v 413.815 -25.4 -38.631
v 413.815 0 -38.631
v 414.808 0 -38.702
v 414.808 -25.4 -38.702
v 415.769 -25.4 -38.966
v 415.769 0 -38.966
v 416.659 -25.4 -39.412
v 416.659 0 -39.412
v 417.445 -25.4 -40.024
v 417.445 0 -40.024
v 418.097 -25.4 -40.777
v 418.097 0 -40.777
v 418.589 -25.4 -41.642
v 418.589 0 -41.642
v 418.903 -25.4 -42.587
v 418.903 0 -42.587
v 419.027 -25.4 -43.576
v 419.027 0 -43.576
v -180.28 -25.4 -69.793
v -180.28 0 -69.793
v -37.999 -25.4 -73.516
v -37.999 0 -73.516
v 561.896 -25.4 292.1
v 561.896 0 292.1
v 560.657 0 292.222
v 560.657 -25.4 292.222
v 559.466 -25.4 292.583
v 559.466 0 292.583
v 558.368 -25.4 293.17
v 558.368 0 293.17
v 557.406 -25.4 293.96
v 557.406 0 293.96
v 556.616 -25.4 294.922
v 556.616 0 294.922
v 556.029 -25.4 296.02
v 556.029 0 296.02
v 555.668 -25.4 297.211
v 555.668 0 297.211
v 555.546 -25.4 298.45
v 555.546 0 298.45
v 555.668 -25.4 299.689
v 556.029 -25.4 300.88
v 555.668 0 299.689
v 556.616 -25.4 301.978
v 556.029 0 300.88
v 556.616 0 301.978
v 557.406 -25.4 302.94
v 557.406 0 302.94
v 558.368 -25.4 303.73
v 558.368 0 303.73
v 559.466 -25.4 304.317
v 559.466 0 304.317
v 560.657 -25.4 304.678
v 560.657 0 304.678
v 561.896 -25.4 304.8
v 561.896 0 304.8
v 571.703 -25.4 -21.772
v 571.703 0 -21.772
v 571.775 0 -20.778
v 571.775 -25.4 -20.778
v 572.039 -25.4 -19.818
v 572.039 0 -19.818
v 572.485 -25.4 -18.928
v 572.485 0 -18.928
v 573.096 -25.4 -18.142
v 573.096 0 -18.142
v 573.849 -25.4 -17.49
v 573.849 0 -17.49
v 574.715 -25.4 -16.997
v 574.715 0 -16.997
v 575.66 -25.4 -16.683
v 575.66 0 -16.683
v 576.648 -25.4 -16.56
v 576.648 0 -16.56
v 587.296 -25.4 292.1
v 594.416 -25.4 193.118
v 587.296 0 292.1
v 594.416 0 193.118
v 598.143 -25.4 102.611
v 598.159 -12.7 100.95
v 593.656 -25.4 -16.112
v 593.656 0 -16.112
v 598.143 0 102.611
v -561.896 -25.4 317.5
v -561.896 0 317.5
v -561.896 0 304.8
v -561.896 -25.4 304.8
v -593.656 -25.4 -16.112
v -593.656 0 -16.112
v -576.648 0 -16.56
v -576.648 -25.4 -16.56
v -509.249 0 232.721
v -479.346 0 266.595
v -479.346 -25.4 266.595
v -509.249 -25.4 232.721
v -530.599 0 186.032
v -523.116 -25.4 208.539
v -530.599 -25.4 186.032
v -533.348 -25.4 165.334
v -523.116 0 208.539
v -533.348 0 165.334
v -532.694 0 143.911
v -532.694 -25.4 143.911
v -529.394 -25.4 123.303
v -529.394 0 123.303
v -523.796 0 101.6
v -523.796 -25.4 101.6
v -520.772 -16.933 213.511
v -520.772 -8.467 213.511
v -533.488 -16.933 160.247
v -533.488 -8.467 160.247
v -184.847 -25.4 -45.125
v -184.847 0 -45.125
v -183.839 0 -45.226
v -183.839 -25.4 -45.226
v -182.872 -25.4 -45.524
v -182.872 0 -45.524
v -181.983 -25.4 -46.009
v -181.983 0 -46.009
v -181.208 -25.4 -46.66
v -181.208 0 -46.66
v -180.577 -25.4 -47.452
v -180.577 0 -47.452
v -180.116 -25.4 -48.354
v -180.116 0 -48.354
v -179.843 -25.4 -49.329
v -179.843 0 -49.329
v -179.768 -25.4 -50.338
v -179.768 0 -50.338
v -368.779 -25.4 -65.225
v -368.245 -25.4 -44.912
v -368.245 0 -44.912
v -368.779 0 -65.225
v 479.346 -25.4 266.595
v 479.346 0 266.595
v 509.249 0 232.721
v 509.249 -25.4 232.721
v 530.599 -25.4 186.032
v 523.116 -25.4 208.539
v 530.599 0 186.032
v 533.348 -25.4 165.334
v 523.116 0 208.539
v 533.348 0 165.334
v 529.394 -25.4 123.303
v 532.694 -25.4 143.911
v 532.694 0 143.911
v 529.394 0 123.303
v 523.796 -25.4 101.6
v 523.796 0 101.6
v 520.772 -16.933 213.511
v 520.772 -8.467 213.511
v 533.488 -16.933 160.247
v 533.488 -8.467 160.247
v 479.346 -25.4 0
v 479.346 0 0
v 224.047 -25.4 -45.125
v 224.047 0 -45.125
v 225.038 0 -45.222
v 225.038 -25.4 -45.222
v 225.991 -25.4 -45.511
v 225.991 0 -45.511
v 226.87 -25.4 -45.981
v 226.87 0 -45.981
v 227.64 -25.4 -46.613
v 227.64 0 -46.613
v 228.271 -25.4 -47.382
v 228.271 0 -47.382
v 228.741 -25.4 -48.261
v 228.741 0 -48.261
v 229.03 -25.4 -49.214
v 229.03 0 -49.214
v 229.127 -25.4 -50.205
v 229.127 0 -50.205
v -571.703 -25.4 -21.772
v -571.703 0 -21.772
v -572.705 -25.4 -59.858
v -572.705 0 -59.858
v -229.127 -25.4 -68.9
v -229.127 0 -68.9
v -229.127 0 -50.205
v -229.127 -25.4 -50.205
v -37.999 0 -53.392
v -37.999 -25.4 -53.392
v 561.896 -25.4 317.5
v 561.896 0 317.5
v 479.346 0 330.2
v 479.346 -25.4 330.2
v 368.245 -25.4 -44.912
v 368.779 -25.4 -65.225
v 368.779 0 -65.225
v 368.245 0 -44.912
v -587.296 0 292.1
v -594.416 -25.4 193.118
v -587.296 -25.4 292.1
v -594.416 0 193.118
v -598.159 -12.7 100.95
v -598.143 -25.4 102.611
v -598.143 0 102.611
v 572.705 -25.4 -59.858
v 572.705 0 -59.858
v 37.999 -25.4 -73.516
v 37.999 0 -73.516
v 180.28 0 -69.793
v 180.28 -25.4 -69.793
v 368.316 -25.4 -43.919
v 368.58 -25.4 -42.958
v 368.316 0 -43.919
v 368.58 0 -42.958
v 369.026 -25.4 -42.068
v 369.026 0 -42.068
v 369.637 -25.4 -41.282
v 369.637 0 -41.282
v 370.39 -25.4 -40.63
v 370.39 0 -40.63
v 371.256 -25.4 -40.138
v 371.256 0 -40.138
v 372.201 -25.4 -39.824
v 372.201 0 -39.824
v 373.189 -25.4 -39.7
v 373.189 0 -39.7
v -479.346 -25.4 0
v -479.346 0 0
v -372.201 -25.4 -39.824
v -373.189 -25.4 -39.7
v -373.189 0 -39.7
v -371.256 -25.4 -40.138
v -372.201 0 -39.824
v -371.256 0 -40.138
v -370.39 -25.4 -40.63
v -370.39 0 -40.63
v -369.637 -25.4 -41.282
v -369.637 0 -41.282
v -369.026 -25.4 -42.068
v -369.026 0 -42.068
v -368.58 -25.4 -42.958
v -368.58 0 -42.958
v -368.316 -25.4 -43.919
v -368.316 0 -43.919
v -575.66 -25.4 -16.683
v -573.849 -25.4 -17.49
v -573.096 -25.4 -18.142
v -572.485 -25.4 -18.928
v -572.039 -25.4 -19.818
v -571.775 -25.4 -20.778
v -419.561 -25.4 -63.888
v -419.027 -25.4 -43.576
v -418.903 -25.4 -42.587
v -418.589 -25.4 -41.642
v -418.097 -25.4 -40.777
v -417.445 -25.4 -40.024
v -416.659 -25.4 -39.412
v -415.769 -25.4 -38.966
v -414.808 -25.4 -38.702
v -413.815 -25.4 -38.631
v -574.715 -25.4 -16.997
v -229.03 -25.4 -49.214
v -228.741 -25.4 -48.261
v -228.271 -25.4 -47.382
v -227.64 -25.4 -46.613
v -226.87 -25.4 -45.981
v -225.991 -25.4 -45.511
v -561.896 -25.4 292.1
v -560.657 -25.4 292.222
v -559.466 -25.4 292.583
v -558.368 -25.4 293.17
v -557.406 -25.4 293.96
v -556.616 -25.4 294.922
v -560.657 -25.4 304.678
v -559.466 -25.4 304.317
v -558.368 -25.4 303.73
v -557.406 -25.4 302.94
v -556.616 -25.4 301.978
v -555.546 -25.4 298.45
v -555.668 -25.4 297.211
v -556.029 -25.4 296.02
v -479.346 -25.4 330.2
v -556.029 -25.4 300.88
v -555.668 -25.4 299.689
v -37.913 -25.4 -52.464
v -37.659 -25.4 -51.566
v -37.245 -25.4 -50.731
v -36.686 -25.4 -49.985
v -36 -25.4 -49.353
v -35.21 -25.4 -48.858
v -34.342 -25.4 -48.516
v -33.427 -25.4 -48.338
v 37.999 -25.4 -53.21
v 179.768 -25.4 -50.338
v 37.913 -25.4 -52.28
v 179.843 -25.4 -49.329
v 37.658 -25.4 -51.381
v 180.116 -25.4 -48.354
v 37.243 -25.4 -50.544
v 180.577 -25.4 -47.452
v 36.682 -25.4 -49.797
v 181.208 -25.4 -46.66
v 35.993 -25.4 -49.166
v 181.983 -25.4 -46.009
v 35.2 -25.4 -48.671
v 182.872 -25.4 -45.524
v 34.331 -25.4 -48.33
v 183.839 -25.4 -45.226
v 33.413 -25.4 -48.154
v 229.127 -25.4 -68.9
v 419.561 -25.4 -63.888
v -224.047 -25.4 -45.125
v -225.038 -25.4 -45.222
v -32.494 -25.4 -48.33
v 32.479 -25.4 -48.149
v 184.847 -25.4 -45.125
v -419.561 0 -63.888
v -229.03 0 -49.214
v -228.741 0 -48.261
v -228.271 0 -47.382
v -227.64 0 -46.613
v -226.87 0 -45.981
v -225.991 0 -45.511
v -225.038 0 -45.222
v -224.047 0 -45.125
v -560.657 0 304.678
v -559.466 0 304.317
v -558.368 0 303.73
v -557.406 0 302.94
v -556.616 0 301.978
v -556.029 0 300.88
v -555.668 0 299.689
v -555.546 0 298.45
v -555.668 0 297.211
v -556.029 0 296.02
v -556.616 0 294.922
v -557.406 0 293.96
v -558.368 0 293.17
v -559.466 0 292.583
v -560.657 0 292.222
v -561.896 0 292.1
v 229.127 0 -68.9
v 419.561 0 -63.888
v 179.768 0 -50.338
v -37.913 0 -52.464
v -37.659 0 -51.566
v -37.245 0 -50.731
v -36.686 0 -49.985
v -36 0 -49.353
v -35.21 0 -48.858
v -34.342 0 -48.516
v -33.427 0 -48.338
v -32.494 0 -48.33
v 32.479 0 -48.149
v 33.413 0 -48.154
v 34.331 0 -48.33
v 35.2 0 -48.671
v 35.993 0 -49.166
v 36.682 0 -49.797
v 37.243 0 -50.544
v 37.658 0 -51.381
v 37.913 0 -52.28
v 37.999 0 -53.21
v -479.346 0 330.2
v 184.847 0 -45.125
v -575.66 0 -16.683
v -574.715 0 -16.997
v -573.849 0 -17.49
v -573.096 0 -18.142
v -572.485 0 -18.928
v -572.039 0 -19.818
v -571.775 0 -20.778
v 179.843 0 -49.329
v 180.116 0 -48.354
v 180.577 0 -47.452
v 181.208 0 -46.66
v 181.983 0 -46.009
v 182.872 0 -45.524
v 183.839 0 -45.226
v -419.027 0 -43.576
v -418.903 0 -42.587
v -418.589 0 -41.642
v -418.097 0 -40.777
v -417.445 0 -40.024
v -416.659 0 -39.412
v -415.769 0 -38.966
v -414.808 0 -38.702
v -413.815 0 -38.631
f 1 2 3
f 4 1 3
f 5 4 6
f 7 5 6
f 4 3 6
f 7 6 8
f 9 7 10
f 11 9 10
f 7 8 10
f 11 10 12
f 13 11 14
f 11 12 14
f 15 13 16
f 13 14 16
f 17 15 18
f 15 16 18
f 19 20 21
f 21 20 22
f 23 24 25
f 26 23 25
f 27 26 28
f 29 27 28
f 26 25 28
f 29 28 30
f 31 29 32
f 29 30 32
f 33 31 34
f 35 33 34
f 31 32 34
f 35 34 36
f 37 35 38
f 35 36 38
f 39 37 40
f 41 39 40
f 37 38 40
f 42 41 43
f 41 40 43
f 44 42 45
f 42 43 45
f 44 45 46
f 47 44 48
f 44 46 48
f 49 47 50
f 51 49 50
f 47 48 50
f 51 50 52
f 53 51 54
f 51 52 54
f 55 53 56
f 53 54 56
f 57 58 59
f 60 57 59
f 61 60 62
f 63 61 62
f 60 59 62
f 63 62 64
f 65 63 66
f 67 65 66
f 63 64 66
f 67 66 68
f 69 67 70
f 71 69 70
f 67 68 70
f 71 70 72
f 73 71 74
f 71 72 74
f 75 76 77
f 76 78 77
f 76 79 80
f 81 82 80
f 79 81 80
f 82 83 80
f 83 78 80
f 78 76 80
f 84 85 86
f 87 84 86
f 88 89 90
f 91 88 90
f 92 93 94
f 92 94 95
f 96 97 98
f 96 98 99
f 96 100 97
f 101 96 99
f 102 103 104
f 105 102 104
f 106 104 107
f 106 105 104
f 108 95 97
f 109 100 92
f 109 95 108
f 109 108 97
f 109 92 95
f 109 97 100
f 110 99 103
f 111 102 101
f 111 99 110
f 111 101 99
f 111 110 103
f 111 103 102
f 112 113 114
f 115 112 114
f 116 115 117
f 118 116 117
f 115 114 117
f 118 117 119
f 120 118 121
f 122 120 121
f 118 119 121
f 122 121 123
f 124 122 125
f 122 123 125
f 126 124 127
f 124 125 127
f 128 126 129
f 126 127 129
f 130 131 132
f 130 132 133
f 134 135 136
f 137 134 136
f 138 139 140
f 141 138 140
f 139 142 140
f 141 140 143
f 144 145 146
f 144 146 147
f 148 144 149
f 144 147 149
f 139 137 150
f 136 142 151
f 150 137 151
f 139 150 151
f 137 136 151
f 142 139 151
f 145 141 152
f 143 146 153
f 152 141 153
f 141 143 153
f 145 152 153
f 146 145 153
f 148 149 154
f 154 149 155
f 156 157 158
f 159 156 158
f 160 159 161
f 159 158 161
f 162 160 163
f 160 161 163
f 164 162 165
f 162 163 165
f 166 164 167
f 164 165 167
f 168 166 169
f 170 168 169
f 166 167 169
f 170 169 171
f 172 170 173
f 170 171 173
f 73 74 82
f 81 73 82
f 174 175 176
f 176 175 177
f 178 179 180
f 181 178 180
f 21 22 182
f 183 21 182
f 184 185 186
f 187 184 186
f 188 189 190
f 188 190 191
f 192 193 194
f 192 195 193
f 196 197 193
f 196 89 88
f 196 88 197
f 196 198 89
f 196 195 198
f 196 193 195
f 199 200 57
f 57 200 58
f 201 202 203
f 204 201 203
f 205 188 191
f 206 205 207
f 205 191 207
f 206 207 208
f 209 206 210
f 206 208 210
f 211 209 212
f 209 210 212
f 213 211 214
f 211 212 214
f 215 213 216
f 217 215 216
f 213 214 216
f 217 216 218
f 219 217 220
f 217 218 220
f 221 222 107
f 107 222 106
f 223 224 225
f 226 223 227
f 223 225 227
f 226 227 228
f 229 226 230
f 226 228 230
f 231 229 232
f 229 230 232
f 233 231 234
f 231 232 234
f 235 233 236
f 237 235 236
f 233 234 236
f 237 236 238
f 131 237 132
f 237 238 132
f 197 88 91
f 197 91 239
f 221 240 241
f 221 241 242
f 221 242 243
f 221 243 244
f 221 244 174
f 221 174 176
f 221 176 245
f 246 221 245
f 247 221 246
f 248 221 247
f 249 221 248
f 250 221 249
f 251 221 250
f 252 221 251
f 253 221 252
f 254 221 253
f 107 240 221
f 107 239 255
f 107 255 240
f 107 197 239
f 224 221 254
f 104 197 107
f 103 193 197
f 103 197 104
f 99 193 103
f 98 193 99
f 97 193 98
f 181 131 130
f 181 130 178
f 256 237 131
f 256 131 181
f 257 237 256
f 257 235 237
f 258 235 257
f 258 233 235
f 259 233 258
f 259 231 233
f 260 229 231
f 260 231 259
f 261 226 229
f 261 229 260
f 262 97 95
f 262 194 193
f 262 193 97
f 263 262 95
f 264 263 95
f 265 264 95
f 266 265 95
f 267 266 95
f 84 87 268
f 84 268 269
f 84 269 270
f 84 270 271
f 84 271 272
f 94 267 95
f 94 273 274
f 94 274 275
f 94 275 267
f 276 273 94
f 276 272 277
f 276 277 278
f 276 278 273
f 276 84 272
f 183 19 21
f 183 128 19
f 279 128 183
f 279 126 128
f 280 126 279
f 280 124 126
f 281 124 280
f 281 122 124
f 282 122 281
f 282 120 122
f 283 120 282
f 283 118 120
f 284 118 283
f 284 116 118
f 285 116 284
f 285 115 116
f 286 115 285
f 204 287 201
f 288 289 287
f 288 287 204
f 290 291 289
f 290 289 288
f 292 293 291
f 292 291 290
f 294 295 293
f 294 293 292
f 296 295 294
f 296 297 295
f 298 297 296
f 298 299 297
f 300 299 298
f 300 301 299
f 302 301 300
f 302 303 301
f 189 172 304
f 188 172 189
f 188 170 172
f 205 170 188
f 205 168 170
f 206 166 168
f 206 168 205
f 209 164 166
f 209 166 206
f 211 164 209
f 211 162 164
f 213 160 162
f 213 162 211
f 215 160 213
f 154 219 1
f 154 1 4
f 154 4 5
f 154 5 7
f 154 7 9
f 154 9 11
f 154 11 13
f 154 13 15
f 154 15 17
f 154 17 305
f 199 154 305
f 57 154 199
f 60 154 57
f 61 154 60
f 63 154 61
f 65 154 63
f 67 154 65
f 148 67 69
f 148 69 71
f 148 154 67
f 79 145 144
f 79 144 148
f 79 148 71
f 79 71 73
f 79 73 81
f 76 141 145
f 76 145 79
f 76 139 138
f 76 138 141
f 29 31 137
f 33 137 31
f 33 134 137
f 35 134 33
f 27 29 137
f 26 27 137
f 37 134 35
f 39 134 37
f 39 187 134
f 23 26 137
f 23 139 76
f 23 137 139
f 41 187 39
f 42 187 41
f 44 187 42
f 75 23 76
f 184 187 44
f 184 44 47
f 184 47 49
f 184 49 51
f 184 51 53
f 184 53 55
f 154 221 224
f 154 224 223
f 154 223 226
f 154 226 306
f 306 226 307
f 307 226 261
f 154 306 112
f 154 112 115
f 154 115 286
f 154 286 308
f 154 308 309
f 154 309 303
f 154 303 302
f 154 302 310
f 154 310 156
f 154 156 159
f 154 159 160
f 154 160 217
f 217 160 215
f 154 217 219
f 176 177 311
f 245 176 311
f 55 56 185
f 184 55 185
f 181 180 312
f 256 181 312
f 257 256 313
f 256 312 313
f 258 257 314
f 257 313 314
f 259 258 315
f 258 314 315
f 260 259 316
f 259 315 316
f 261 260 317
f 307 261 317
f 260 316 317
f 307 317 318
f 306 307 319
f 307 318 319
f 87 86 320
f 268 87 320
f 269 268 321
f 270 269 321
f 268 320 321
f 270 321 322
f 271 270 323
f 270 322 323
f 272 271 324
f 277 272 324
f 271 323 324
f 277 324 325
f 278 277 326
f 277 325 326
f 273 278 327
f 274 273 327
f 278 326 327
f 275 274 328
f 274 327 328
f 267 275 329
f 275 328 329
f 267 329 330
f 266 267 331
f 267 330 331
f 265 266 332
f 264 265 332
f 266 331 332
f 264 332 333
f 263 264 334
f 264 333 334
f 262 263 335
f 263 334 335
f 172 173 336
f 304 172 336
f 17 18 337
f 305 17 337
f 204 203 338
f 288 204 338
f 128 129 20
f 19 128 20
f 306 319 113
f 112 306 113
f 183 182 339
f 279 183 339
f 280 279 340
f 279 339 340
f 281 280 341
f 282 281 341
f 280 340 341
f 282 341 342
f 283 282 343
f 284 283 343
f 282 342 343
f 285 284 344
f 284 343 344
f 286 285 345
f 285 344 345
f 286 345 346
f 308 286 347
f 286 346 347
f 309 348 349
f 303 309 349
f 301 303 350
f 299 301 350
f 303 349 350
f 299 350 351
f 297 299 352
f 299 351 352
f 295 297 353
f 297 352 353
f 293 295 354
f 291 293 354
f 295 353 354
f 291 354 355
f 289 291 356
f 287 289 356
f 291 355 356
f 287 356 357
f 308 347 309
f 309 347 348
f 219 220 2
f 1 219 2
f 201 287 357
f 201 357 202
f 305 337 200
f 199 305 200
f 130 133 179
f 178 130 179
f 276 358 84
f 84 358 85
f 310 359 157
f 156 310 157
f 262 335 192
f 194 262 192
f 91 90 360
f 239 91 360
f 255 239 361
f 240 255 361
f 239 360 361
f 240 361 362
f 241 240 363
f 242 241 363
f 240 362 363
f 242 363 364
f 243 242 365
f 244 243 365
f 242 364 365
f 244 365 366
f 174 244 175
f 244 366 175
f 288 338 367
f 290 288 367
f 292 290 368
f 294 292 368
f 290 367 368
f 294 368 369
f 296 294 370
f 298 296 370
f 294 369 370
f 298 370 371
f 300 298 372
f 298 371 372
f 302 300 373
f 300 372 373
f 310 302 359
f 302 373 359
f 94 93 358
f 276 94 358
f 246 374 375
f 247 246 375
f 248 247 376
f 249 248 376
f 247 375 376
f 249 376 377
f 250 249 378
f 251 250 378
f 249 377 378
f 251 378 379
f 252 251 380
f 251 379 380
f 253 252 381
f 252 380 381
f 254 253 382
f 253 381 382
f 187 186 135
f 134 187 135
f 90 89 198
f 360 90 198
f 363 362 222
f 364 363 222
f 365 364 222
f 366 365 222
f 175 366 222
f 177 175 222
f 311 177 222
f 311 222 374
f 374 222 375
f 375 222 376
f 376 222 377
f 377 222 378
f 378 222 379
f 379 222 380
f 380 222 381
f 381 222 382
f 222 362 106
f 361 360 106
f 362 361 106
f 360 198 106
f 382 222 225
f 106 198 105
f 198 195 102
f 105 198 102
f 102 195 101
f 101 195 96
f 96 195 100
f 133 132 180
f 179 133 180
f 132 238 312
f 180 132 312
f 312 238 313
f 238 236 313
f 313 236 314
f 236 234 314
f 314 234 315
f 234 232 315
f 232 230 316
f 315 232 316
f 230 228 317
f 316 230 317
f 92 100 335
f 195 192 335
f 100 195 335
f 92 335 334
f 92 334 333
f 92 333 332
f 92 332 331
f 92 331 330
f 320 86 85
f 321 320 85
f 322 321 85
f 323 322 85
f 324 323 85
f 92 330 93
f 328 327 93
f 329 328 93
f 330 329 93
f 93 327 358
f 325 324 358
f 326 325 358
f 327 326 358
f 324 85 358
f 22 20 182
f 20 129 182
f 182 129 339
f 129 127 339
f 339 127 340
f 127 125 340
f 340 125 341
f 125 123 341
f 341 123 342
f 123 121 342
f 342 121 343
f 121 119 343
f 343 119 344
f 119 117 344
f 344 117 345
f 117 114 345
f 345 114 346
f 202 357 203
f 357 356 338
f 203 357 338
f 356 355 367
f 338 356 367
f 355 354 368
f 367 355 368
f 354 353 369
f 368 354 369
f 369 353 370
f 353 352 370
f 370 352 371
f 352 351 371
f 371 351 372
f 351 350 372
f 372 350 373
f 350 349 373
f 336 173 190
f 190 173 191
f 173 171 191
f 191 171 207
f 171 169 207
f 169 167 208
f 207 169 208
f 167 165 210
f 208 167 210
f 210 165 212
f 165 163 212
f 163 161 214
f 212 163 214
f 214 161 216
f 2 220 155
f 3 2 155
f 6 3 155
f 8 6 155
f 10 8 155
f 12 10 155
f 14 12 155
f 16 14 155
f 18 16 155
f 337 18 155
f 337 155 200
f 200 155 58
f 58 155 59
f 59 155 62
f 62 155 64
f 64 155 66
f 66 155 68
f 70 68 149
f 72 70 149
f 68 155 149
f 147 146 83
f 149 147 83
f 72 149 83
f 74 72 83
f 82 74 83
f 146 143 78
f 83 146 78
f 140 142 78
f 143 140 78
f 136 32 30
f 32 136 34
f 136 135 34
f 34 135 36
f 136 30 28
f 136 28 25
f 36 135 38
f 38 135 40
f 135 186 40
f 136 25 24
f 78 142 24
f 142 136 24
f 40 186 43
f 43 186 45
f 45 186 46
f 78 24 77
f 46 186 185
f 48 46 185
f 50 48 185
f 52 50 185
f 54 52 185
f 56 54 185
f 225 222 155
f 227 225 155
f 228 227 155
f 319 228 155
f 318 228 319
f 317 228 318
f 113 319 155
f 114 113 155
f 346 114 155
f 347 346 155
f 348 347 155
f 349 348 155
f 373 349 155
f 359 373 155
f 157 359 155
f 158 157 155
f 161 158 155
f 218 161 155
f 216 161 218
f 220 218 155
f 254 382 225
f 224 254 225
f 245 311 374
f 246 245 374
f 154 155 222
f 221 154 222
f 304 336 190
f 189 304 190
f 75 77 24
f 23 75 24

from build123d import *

# Parameters (mm, degrees)
F1_DEPTH = 25.4


with BuildPart() as f1:
    # F0 (on Front) → F1 (new body)
    with BuildSketch(Plane.XZ):
        with BuildLine():
            Line((-180.280449281, -69.793186067), (-37.9985533655, -73.516196597))
            Line((-37.9985533655, -73.516196597), (-37.9985533655, -53.3922091126))
            ThreePointArc((-37.9985533655, -53.3922091126), (-36.3574166334, -49.6531424612), (-32.4943724898, -48.3299496779))
            Line((-32.4943724898, -48.3299496779), (32.4792108915, -48.1490081299))
            ThreePointArc((32.4792108915, -48.1490081299), (36.3518127667, -49.4657614096), (37.9985533655, -53.209974262))
            Line((37.9985533655, -53.209974262), (37.9985533655, -73.516196597))
            Line((37.9985533655, -73.516196597), (180.280449281, -69.793186067))
            Line((180.280449281, -69.793186067), (179.7684819711, -50.3384282921))
            ThreePointArc((179.7684819711, -50.3384282921), (181.2076799987, -46.6602509384), (184.8467238815, -45.124790347))
            Line((184.8467238815, -45.124790347), (224.0474202454, -45.124790347))
            ThreePointArc((224.0474202454, -45.124790347), (227.6395226938, -46.6126878986), (229.1274202454, -50.204790347))
            Line((229.1274202454, -50.204790347), (229.1274202454, -68.8998913716))
            Line((229.1274202454, -68.8998913716), (368.779072779, -65.2248478839))
            Line((368.779072779, -65.2248478839), (368.2445209989, -44.9118802426))
            ThreePointArc((368.2445209989, -44.9118802426), (369.6374073208, -41.2818793035), (373.1891249642, -39.7000003873))
            Line((373.1891249642, -39.7000003873), (413.8150602467, -38.6308968272))
            ThreePointArc((413.8150602467, -38.6308968272), (417.4450611859, -40.0237831491), (419.0269401021, -43.5755007925))
            Line((419.0269401021, -43.5755007925), (419.5614918821, -63.8884684338))
            Line((419.5614918821, -63.8884684338), (572.7053844218, -59.8583659985))
            Line((572.7053844218, -59.8583659985), (571.7030998342, -21.7715516712))
            ThreePointArc((571.7030998342, -21.7715516712), (573.0959861561, -18.141550732), (576.6477037995, -16.5596718159))
            Line((576.6477037995, -16.5596718159), (593.6560001815, -16.112085069))
            add(Edge.make_bspline(
                [(593.6560001815, -16.112085069), (596.1080901801, 20.5341002257), (601.6949471336, 104.0289944805), (592.471101525, 224.502637459), (587.295632267, 292.1)],
                knots=[0, 0, 0, 0, 0.4389033081, 1, 1, 1, 1], degree=3))
            Line((587.295632267, 292.1), (561.895632267, 292.1))
            ThreePointArc((561.895632267, 292.1), (555.545632267, 298.45), (561.895632267, 304.8))
            Line((561.895632267, 304.8), (561.895632267, 317.5))
            Line((561.895632267, 317.5), (479.345632267, 330.2))
            Line((479.345632267, 330.2), (479.345632267, 266.595095396))
            add(Edge.make_bspline(
                [(479.345632267, 266.595095396), (537.2284650803, 211.8650227785), (542.5910949707, 164.6739989519), (523.795632267, 101.6)],
                knots=[0, 0, 0, 0, 170.8776872642, 170.8776872642, 170.8776872642, 170.8776872642], degree=3))
            Line((523.795632267, 101.6), (479.345632267, 0))
            Line((479.345632267, 0), (0, 0))
            Line((0, 0), (-479.345632267, 0))
            Line((-479.345632267, 0), (-523.795632267, 101.6))
            add(Edge.make_bspline(
                [(-479.345632267, 266.595095396), (-537.2284650803, 211.8650227785), (-542.5910949707, 164.6739989519), (-523.795632267, 101.6)],
                knots=[0, 0, 0, 0, 170.8776872642, 170.8776872642, 170.8776872642, 170.8776872642], degree=3))
            Line((-479.345632267, 266.595095396), (-479.345632267, 330.2))
            Line((-479.345632267, 330.2), (-561.895632267, 317.5))
            Line((-561.895632267, 317.5), (-561.895632267, 304.8))
            ThreePointArc((-561.895632267, 304.8), (-555.545632267, 298.45), (-561.895632267, 292.1))
            Line((-561.895632267, 292.1), (-587.295632267, 292.1))
            add(Edge.make_bspline(
                [(-593.6560001815, -16.112085069), (-596.1080901801, 20.5341002257), (-601.6949471336, 104.0289944805), (-592.471101525, 224.502637459), (-587.295632267, 292.1)],
                knots=[0, 0, 0, 0, 0.4389033081, 1, 1, 1, 1], degree=3))
            Line((-593.6560001815, -16.112085069), (-576.6477037995, -16.5596718159))
            ThreePointArc((-576.6477037995, -16.5596718159), (-573.0959861561, -18.141550732), (-571.7030998342, -21.7715516712))
            Line((-571.7030998342, -21.7715516712), (-572.7053844218, -59.8583659985))
            Line((-572.7053844218, -59.8583659985), (-419.5614918821, -63.8884684338))
            Line((-419.5614918821, -63.8884684338), (-419.0269401021, -43.5755007925))
            ThreePointArc((-419.0269401021, -43.5755007925), (-417.4450611859, -40.0237831491), (-413.8150602467, -38.6308968272))
            Line((-413.8150602467, -38.6308968272), (-373.1891249642, -39.7000003873))
            ThreePointArc((-373.1891249642, -39.7000003873), (-369.6374073208, -41.2818793035), (-368.2445209989, -44.9118802426))
            Line((-368.2445209989, -44.9118802426), (-368.779072779, -65.2248478839))
            Line((-368.779072779, -65.2248478839), (-229.1274202454, -68.8998913716))
            Line((-229.1274202454, -68.8998913716), (-229.1274202454, -50.204790347))
            ThreePointArc((-229.1274202454, -50.204790347), (-227.6395226938, -46.6126878986), (-224.0474202454, -45.124790347))
            Line((-224.0474202454, -45.124790347), (-184.8467238815, -45.124790347))
            ThreePointArc((-184.8467238815, -45.124790347), (-181.2076799987, -46.6602509384), (-179.7684819711, -50.3384282921))
            Line((-179.7684819711, -50.3384282921), (-180.280449281, -69.793186067))
        make_face()
    extrude(amount=F1_DEPTH)


solid = f1.part
